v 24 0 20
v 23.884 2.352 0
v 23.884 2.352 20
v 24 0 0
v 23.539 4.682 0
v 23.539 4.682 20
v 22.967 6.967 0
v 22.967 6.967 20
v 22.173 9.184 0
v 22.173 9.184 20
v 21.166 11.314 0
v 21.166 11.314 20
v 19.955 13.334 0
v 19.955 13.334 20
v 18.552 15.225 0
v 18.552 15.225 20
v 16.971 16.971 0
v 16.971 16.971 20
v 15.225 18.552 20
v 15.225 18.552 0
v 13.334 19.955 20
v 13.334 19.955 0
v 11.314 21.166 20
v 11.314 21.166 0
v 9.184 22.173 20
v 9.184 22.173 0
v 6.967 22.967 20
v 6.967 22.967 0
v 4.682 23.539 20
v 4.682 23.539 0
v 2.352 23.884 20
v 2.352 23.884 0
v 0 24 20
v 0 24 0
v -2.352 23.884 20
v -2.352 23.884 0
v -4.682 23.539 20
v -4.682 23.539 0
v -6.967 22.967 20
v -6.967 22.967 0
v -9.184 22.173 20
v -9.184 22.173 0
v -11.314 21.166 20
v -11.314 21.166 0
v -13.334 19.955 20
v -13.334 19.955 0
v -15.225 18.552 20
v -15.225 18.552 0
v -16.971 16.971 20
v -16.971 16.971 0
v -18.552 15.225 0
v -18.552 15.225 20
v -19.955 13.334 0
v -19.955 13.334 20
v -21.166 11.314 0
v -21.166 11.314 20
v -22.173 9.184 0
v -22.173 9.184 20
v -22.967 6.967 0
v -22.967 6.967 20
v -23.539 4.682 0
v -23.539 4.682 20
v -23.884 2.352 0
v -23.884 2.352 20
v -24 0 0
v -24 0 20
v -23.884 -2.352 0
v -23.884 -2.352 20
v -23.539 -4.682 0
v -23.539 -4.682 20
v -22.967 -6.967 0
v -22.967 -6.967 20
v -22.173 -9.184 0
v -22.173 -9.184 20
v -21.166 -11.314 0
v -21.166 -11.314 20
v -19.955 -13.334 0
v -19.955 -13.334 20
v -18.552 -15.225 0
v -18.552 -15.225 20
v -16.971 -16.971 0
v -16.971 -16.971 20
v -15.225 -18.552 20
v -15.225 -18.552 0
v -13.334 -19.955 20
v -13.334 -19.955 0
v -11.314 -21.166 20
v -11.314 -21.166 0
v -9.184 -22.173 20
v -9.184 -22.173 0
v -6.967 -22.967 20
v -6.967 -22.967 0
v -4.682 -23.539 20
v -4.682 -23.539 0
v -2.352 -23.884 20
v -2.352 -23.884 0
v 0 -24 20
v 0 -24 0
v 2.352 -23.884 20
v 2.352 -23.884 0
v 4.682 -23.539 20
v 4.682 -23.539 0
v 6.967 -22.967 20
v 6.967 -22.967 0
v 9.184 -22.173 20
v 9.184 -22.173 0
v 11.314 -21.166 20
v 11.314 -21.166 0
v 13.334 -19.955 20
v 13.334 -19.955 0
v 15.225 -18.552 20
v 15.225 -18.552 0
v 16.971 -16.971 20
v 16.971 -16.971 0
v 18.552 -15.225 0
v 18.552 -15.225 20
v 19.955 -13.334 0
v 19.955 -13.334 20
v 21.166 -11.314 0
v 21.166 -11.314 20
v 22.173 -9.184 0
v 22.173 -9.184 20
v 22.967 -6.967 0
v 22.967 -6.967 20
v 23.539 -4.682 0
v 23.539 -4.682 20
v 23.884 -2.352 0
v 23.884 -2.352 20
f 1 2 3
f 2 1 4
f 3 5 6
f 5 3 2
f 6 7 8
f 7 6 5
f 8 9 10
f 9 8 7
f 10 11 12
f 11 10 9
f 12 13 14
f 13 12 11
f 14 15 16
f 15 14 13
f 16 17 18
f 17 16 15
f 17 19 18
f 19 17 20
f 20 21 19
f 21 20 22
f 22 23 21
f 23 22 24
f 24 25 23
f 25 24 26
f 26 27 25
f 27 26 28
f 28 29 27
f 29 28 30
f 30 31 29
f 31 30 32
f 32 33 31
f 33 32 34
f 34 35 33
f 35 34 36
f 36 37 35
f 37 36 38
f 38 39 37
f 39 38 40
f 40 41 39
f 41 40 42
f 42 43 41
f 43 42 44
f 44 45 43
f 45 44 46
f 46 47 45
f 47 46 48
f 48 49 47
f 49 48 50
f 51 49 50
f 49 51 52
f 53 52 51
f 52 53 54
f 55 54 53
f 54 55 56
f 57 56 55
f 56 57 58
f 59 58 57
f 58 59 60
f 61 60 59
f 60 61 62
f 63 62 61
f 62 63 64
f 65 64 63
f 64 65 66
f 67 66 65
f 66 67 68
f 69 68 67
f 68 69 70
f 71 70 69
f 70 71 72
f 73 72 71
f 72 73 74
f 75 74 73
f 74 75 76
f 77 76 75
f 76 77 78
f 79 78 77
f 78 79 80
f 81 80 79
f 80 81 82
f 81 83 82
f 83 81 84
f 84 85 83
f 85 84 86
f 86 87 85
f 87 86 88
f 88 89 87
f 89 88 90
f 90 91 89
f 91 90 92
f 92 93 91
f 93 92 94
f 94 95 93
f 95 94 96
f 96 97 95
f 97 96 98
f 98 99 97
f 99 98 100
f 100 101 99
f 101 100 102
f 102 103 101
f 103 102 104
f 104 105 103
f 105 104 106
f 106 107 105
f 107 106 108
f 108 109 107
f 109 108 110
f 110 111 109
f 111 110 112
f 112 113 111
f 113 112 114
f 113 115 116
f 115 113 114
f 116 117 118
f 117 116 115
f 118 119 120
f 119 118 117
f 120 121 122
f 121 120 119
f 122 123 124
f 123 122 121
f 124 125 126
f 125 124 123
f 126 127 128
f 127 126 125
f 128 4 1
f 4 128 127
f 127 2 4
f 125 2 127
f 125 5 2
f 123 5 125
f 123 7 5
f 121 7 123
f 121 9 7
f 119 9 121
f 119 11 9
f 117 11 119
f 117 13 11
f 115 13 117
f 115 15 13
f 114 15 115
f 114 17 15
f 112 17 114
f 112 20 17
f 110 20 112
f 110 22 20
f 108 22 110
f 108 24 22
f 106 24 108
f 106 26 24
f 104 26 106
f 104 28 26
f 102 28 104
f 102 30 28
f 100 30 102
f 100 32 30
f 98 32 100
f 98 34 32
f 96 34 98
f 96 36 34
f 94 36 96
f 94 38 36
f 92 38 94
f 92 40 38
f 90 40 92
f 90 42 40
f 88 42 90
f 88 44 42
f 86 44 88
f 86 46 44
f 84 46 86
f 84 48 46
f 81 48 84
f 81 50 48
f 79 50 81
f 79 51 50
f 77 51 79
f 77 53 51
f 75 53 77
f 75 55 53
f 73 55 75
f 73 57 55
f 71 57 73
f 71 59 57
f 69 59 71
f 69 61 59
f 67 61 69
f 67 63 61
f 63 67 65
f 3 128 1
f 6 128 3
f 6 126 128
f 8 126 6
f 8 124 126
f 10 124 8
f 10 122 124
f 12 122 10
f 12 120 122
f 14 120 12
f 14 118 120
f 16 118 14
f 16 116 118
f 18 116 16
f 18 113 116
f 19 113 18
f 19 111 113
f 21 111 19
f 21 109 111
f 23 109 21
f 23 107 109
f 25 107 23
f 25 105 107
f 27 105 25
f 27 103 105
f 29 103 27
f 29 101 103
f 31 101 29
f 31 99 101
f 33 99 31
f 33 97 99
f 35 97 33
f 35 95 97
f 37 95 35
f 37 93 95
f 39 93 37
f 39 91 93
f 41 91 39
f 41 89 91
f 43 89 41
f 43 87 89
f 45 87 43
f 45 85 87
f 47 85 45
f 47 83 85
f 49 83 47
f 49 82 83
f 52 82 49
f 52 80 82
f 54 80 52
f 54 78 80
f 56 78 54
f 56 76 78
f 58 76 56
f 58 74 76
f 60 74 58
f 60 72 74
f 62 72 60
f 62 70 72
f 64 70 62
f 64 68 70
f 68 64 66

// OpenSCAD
// Starter file for task-002.
// Edit this file in OpenSCAD to complete the requested hard task.
$fn = 64;

height = 20;
body_d = 48;

module pulley_blank() {
    cylinder(d=body_d, h=height);
}

pulley_blank();
